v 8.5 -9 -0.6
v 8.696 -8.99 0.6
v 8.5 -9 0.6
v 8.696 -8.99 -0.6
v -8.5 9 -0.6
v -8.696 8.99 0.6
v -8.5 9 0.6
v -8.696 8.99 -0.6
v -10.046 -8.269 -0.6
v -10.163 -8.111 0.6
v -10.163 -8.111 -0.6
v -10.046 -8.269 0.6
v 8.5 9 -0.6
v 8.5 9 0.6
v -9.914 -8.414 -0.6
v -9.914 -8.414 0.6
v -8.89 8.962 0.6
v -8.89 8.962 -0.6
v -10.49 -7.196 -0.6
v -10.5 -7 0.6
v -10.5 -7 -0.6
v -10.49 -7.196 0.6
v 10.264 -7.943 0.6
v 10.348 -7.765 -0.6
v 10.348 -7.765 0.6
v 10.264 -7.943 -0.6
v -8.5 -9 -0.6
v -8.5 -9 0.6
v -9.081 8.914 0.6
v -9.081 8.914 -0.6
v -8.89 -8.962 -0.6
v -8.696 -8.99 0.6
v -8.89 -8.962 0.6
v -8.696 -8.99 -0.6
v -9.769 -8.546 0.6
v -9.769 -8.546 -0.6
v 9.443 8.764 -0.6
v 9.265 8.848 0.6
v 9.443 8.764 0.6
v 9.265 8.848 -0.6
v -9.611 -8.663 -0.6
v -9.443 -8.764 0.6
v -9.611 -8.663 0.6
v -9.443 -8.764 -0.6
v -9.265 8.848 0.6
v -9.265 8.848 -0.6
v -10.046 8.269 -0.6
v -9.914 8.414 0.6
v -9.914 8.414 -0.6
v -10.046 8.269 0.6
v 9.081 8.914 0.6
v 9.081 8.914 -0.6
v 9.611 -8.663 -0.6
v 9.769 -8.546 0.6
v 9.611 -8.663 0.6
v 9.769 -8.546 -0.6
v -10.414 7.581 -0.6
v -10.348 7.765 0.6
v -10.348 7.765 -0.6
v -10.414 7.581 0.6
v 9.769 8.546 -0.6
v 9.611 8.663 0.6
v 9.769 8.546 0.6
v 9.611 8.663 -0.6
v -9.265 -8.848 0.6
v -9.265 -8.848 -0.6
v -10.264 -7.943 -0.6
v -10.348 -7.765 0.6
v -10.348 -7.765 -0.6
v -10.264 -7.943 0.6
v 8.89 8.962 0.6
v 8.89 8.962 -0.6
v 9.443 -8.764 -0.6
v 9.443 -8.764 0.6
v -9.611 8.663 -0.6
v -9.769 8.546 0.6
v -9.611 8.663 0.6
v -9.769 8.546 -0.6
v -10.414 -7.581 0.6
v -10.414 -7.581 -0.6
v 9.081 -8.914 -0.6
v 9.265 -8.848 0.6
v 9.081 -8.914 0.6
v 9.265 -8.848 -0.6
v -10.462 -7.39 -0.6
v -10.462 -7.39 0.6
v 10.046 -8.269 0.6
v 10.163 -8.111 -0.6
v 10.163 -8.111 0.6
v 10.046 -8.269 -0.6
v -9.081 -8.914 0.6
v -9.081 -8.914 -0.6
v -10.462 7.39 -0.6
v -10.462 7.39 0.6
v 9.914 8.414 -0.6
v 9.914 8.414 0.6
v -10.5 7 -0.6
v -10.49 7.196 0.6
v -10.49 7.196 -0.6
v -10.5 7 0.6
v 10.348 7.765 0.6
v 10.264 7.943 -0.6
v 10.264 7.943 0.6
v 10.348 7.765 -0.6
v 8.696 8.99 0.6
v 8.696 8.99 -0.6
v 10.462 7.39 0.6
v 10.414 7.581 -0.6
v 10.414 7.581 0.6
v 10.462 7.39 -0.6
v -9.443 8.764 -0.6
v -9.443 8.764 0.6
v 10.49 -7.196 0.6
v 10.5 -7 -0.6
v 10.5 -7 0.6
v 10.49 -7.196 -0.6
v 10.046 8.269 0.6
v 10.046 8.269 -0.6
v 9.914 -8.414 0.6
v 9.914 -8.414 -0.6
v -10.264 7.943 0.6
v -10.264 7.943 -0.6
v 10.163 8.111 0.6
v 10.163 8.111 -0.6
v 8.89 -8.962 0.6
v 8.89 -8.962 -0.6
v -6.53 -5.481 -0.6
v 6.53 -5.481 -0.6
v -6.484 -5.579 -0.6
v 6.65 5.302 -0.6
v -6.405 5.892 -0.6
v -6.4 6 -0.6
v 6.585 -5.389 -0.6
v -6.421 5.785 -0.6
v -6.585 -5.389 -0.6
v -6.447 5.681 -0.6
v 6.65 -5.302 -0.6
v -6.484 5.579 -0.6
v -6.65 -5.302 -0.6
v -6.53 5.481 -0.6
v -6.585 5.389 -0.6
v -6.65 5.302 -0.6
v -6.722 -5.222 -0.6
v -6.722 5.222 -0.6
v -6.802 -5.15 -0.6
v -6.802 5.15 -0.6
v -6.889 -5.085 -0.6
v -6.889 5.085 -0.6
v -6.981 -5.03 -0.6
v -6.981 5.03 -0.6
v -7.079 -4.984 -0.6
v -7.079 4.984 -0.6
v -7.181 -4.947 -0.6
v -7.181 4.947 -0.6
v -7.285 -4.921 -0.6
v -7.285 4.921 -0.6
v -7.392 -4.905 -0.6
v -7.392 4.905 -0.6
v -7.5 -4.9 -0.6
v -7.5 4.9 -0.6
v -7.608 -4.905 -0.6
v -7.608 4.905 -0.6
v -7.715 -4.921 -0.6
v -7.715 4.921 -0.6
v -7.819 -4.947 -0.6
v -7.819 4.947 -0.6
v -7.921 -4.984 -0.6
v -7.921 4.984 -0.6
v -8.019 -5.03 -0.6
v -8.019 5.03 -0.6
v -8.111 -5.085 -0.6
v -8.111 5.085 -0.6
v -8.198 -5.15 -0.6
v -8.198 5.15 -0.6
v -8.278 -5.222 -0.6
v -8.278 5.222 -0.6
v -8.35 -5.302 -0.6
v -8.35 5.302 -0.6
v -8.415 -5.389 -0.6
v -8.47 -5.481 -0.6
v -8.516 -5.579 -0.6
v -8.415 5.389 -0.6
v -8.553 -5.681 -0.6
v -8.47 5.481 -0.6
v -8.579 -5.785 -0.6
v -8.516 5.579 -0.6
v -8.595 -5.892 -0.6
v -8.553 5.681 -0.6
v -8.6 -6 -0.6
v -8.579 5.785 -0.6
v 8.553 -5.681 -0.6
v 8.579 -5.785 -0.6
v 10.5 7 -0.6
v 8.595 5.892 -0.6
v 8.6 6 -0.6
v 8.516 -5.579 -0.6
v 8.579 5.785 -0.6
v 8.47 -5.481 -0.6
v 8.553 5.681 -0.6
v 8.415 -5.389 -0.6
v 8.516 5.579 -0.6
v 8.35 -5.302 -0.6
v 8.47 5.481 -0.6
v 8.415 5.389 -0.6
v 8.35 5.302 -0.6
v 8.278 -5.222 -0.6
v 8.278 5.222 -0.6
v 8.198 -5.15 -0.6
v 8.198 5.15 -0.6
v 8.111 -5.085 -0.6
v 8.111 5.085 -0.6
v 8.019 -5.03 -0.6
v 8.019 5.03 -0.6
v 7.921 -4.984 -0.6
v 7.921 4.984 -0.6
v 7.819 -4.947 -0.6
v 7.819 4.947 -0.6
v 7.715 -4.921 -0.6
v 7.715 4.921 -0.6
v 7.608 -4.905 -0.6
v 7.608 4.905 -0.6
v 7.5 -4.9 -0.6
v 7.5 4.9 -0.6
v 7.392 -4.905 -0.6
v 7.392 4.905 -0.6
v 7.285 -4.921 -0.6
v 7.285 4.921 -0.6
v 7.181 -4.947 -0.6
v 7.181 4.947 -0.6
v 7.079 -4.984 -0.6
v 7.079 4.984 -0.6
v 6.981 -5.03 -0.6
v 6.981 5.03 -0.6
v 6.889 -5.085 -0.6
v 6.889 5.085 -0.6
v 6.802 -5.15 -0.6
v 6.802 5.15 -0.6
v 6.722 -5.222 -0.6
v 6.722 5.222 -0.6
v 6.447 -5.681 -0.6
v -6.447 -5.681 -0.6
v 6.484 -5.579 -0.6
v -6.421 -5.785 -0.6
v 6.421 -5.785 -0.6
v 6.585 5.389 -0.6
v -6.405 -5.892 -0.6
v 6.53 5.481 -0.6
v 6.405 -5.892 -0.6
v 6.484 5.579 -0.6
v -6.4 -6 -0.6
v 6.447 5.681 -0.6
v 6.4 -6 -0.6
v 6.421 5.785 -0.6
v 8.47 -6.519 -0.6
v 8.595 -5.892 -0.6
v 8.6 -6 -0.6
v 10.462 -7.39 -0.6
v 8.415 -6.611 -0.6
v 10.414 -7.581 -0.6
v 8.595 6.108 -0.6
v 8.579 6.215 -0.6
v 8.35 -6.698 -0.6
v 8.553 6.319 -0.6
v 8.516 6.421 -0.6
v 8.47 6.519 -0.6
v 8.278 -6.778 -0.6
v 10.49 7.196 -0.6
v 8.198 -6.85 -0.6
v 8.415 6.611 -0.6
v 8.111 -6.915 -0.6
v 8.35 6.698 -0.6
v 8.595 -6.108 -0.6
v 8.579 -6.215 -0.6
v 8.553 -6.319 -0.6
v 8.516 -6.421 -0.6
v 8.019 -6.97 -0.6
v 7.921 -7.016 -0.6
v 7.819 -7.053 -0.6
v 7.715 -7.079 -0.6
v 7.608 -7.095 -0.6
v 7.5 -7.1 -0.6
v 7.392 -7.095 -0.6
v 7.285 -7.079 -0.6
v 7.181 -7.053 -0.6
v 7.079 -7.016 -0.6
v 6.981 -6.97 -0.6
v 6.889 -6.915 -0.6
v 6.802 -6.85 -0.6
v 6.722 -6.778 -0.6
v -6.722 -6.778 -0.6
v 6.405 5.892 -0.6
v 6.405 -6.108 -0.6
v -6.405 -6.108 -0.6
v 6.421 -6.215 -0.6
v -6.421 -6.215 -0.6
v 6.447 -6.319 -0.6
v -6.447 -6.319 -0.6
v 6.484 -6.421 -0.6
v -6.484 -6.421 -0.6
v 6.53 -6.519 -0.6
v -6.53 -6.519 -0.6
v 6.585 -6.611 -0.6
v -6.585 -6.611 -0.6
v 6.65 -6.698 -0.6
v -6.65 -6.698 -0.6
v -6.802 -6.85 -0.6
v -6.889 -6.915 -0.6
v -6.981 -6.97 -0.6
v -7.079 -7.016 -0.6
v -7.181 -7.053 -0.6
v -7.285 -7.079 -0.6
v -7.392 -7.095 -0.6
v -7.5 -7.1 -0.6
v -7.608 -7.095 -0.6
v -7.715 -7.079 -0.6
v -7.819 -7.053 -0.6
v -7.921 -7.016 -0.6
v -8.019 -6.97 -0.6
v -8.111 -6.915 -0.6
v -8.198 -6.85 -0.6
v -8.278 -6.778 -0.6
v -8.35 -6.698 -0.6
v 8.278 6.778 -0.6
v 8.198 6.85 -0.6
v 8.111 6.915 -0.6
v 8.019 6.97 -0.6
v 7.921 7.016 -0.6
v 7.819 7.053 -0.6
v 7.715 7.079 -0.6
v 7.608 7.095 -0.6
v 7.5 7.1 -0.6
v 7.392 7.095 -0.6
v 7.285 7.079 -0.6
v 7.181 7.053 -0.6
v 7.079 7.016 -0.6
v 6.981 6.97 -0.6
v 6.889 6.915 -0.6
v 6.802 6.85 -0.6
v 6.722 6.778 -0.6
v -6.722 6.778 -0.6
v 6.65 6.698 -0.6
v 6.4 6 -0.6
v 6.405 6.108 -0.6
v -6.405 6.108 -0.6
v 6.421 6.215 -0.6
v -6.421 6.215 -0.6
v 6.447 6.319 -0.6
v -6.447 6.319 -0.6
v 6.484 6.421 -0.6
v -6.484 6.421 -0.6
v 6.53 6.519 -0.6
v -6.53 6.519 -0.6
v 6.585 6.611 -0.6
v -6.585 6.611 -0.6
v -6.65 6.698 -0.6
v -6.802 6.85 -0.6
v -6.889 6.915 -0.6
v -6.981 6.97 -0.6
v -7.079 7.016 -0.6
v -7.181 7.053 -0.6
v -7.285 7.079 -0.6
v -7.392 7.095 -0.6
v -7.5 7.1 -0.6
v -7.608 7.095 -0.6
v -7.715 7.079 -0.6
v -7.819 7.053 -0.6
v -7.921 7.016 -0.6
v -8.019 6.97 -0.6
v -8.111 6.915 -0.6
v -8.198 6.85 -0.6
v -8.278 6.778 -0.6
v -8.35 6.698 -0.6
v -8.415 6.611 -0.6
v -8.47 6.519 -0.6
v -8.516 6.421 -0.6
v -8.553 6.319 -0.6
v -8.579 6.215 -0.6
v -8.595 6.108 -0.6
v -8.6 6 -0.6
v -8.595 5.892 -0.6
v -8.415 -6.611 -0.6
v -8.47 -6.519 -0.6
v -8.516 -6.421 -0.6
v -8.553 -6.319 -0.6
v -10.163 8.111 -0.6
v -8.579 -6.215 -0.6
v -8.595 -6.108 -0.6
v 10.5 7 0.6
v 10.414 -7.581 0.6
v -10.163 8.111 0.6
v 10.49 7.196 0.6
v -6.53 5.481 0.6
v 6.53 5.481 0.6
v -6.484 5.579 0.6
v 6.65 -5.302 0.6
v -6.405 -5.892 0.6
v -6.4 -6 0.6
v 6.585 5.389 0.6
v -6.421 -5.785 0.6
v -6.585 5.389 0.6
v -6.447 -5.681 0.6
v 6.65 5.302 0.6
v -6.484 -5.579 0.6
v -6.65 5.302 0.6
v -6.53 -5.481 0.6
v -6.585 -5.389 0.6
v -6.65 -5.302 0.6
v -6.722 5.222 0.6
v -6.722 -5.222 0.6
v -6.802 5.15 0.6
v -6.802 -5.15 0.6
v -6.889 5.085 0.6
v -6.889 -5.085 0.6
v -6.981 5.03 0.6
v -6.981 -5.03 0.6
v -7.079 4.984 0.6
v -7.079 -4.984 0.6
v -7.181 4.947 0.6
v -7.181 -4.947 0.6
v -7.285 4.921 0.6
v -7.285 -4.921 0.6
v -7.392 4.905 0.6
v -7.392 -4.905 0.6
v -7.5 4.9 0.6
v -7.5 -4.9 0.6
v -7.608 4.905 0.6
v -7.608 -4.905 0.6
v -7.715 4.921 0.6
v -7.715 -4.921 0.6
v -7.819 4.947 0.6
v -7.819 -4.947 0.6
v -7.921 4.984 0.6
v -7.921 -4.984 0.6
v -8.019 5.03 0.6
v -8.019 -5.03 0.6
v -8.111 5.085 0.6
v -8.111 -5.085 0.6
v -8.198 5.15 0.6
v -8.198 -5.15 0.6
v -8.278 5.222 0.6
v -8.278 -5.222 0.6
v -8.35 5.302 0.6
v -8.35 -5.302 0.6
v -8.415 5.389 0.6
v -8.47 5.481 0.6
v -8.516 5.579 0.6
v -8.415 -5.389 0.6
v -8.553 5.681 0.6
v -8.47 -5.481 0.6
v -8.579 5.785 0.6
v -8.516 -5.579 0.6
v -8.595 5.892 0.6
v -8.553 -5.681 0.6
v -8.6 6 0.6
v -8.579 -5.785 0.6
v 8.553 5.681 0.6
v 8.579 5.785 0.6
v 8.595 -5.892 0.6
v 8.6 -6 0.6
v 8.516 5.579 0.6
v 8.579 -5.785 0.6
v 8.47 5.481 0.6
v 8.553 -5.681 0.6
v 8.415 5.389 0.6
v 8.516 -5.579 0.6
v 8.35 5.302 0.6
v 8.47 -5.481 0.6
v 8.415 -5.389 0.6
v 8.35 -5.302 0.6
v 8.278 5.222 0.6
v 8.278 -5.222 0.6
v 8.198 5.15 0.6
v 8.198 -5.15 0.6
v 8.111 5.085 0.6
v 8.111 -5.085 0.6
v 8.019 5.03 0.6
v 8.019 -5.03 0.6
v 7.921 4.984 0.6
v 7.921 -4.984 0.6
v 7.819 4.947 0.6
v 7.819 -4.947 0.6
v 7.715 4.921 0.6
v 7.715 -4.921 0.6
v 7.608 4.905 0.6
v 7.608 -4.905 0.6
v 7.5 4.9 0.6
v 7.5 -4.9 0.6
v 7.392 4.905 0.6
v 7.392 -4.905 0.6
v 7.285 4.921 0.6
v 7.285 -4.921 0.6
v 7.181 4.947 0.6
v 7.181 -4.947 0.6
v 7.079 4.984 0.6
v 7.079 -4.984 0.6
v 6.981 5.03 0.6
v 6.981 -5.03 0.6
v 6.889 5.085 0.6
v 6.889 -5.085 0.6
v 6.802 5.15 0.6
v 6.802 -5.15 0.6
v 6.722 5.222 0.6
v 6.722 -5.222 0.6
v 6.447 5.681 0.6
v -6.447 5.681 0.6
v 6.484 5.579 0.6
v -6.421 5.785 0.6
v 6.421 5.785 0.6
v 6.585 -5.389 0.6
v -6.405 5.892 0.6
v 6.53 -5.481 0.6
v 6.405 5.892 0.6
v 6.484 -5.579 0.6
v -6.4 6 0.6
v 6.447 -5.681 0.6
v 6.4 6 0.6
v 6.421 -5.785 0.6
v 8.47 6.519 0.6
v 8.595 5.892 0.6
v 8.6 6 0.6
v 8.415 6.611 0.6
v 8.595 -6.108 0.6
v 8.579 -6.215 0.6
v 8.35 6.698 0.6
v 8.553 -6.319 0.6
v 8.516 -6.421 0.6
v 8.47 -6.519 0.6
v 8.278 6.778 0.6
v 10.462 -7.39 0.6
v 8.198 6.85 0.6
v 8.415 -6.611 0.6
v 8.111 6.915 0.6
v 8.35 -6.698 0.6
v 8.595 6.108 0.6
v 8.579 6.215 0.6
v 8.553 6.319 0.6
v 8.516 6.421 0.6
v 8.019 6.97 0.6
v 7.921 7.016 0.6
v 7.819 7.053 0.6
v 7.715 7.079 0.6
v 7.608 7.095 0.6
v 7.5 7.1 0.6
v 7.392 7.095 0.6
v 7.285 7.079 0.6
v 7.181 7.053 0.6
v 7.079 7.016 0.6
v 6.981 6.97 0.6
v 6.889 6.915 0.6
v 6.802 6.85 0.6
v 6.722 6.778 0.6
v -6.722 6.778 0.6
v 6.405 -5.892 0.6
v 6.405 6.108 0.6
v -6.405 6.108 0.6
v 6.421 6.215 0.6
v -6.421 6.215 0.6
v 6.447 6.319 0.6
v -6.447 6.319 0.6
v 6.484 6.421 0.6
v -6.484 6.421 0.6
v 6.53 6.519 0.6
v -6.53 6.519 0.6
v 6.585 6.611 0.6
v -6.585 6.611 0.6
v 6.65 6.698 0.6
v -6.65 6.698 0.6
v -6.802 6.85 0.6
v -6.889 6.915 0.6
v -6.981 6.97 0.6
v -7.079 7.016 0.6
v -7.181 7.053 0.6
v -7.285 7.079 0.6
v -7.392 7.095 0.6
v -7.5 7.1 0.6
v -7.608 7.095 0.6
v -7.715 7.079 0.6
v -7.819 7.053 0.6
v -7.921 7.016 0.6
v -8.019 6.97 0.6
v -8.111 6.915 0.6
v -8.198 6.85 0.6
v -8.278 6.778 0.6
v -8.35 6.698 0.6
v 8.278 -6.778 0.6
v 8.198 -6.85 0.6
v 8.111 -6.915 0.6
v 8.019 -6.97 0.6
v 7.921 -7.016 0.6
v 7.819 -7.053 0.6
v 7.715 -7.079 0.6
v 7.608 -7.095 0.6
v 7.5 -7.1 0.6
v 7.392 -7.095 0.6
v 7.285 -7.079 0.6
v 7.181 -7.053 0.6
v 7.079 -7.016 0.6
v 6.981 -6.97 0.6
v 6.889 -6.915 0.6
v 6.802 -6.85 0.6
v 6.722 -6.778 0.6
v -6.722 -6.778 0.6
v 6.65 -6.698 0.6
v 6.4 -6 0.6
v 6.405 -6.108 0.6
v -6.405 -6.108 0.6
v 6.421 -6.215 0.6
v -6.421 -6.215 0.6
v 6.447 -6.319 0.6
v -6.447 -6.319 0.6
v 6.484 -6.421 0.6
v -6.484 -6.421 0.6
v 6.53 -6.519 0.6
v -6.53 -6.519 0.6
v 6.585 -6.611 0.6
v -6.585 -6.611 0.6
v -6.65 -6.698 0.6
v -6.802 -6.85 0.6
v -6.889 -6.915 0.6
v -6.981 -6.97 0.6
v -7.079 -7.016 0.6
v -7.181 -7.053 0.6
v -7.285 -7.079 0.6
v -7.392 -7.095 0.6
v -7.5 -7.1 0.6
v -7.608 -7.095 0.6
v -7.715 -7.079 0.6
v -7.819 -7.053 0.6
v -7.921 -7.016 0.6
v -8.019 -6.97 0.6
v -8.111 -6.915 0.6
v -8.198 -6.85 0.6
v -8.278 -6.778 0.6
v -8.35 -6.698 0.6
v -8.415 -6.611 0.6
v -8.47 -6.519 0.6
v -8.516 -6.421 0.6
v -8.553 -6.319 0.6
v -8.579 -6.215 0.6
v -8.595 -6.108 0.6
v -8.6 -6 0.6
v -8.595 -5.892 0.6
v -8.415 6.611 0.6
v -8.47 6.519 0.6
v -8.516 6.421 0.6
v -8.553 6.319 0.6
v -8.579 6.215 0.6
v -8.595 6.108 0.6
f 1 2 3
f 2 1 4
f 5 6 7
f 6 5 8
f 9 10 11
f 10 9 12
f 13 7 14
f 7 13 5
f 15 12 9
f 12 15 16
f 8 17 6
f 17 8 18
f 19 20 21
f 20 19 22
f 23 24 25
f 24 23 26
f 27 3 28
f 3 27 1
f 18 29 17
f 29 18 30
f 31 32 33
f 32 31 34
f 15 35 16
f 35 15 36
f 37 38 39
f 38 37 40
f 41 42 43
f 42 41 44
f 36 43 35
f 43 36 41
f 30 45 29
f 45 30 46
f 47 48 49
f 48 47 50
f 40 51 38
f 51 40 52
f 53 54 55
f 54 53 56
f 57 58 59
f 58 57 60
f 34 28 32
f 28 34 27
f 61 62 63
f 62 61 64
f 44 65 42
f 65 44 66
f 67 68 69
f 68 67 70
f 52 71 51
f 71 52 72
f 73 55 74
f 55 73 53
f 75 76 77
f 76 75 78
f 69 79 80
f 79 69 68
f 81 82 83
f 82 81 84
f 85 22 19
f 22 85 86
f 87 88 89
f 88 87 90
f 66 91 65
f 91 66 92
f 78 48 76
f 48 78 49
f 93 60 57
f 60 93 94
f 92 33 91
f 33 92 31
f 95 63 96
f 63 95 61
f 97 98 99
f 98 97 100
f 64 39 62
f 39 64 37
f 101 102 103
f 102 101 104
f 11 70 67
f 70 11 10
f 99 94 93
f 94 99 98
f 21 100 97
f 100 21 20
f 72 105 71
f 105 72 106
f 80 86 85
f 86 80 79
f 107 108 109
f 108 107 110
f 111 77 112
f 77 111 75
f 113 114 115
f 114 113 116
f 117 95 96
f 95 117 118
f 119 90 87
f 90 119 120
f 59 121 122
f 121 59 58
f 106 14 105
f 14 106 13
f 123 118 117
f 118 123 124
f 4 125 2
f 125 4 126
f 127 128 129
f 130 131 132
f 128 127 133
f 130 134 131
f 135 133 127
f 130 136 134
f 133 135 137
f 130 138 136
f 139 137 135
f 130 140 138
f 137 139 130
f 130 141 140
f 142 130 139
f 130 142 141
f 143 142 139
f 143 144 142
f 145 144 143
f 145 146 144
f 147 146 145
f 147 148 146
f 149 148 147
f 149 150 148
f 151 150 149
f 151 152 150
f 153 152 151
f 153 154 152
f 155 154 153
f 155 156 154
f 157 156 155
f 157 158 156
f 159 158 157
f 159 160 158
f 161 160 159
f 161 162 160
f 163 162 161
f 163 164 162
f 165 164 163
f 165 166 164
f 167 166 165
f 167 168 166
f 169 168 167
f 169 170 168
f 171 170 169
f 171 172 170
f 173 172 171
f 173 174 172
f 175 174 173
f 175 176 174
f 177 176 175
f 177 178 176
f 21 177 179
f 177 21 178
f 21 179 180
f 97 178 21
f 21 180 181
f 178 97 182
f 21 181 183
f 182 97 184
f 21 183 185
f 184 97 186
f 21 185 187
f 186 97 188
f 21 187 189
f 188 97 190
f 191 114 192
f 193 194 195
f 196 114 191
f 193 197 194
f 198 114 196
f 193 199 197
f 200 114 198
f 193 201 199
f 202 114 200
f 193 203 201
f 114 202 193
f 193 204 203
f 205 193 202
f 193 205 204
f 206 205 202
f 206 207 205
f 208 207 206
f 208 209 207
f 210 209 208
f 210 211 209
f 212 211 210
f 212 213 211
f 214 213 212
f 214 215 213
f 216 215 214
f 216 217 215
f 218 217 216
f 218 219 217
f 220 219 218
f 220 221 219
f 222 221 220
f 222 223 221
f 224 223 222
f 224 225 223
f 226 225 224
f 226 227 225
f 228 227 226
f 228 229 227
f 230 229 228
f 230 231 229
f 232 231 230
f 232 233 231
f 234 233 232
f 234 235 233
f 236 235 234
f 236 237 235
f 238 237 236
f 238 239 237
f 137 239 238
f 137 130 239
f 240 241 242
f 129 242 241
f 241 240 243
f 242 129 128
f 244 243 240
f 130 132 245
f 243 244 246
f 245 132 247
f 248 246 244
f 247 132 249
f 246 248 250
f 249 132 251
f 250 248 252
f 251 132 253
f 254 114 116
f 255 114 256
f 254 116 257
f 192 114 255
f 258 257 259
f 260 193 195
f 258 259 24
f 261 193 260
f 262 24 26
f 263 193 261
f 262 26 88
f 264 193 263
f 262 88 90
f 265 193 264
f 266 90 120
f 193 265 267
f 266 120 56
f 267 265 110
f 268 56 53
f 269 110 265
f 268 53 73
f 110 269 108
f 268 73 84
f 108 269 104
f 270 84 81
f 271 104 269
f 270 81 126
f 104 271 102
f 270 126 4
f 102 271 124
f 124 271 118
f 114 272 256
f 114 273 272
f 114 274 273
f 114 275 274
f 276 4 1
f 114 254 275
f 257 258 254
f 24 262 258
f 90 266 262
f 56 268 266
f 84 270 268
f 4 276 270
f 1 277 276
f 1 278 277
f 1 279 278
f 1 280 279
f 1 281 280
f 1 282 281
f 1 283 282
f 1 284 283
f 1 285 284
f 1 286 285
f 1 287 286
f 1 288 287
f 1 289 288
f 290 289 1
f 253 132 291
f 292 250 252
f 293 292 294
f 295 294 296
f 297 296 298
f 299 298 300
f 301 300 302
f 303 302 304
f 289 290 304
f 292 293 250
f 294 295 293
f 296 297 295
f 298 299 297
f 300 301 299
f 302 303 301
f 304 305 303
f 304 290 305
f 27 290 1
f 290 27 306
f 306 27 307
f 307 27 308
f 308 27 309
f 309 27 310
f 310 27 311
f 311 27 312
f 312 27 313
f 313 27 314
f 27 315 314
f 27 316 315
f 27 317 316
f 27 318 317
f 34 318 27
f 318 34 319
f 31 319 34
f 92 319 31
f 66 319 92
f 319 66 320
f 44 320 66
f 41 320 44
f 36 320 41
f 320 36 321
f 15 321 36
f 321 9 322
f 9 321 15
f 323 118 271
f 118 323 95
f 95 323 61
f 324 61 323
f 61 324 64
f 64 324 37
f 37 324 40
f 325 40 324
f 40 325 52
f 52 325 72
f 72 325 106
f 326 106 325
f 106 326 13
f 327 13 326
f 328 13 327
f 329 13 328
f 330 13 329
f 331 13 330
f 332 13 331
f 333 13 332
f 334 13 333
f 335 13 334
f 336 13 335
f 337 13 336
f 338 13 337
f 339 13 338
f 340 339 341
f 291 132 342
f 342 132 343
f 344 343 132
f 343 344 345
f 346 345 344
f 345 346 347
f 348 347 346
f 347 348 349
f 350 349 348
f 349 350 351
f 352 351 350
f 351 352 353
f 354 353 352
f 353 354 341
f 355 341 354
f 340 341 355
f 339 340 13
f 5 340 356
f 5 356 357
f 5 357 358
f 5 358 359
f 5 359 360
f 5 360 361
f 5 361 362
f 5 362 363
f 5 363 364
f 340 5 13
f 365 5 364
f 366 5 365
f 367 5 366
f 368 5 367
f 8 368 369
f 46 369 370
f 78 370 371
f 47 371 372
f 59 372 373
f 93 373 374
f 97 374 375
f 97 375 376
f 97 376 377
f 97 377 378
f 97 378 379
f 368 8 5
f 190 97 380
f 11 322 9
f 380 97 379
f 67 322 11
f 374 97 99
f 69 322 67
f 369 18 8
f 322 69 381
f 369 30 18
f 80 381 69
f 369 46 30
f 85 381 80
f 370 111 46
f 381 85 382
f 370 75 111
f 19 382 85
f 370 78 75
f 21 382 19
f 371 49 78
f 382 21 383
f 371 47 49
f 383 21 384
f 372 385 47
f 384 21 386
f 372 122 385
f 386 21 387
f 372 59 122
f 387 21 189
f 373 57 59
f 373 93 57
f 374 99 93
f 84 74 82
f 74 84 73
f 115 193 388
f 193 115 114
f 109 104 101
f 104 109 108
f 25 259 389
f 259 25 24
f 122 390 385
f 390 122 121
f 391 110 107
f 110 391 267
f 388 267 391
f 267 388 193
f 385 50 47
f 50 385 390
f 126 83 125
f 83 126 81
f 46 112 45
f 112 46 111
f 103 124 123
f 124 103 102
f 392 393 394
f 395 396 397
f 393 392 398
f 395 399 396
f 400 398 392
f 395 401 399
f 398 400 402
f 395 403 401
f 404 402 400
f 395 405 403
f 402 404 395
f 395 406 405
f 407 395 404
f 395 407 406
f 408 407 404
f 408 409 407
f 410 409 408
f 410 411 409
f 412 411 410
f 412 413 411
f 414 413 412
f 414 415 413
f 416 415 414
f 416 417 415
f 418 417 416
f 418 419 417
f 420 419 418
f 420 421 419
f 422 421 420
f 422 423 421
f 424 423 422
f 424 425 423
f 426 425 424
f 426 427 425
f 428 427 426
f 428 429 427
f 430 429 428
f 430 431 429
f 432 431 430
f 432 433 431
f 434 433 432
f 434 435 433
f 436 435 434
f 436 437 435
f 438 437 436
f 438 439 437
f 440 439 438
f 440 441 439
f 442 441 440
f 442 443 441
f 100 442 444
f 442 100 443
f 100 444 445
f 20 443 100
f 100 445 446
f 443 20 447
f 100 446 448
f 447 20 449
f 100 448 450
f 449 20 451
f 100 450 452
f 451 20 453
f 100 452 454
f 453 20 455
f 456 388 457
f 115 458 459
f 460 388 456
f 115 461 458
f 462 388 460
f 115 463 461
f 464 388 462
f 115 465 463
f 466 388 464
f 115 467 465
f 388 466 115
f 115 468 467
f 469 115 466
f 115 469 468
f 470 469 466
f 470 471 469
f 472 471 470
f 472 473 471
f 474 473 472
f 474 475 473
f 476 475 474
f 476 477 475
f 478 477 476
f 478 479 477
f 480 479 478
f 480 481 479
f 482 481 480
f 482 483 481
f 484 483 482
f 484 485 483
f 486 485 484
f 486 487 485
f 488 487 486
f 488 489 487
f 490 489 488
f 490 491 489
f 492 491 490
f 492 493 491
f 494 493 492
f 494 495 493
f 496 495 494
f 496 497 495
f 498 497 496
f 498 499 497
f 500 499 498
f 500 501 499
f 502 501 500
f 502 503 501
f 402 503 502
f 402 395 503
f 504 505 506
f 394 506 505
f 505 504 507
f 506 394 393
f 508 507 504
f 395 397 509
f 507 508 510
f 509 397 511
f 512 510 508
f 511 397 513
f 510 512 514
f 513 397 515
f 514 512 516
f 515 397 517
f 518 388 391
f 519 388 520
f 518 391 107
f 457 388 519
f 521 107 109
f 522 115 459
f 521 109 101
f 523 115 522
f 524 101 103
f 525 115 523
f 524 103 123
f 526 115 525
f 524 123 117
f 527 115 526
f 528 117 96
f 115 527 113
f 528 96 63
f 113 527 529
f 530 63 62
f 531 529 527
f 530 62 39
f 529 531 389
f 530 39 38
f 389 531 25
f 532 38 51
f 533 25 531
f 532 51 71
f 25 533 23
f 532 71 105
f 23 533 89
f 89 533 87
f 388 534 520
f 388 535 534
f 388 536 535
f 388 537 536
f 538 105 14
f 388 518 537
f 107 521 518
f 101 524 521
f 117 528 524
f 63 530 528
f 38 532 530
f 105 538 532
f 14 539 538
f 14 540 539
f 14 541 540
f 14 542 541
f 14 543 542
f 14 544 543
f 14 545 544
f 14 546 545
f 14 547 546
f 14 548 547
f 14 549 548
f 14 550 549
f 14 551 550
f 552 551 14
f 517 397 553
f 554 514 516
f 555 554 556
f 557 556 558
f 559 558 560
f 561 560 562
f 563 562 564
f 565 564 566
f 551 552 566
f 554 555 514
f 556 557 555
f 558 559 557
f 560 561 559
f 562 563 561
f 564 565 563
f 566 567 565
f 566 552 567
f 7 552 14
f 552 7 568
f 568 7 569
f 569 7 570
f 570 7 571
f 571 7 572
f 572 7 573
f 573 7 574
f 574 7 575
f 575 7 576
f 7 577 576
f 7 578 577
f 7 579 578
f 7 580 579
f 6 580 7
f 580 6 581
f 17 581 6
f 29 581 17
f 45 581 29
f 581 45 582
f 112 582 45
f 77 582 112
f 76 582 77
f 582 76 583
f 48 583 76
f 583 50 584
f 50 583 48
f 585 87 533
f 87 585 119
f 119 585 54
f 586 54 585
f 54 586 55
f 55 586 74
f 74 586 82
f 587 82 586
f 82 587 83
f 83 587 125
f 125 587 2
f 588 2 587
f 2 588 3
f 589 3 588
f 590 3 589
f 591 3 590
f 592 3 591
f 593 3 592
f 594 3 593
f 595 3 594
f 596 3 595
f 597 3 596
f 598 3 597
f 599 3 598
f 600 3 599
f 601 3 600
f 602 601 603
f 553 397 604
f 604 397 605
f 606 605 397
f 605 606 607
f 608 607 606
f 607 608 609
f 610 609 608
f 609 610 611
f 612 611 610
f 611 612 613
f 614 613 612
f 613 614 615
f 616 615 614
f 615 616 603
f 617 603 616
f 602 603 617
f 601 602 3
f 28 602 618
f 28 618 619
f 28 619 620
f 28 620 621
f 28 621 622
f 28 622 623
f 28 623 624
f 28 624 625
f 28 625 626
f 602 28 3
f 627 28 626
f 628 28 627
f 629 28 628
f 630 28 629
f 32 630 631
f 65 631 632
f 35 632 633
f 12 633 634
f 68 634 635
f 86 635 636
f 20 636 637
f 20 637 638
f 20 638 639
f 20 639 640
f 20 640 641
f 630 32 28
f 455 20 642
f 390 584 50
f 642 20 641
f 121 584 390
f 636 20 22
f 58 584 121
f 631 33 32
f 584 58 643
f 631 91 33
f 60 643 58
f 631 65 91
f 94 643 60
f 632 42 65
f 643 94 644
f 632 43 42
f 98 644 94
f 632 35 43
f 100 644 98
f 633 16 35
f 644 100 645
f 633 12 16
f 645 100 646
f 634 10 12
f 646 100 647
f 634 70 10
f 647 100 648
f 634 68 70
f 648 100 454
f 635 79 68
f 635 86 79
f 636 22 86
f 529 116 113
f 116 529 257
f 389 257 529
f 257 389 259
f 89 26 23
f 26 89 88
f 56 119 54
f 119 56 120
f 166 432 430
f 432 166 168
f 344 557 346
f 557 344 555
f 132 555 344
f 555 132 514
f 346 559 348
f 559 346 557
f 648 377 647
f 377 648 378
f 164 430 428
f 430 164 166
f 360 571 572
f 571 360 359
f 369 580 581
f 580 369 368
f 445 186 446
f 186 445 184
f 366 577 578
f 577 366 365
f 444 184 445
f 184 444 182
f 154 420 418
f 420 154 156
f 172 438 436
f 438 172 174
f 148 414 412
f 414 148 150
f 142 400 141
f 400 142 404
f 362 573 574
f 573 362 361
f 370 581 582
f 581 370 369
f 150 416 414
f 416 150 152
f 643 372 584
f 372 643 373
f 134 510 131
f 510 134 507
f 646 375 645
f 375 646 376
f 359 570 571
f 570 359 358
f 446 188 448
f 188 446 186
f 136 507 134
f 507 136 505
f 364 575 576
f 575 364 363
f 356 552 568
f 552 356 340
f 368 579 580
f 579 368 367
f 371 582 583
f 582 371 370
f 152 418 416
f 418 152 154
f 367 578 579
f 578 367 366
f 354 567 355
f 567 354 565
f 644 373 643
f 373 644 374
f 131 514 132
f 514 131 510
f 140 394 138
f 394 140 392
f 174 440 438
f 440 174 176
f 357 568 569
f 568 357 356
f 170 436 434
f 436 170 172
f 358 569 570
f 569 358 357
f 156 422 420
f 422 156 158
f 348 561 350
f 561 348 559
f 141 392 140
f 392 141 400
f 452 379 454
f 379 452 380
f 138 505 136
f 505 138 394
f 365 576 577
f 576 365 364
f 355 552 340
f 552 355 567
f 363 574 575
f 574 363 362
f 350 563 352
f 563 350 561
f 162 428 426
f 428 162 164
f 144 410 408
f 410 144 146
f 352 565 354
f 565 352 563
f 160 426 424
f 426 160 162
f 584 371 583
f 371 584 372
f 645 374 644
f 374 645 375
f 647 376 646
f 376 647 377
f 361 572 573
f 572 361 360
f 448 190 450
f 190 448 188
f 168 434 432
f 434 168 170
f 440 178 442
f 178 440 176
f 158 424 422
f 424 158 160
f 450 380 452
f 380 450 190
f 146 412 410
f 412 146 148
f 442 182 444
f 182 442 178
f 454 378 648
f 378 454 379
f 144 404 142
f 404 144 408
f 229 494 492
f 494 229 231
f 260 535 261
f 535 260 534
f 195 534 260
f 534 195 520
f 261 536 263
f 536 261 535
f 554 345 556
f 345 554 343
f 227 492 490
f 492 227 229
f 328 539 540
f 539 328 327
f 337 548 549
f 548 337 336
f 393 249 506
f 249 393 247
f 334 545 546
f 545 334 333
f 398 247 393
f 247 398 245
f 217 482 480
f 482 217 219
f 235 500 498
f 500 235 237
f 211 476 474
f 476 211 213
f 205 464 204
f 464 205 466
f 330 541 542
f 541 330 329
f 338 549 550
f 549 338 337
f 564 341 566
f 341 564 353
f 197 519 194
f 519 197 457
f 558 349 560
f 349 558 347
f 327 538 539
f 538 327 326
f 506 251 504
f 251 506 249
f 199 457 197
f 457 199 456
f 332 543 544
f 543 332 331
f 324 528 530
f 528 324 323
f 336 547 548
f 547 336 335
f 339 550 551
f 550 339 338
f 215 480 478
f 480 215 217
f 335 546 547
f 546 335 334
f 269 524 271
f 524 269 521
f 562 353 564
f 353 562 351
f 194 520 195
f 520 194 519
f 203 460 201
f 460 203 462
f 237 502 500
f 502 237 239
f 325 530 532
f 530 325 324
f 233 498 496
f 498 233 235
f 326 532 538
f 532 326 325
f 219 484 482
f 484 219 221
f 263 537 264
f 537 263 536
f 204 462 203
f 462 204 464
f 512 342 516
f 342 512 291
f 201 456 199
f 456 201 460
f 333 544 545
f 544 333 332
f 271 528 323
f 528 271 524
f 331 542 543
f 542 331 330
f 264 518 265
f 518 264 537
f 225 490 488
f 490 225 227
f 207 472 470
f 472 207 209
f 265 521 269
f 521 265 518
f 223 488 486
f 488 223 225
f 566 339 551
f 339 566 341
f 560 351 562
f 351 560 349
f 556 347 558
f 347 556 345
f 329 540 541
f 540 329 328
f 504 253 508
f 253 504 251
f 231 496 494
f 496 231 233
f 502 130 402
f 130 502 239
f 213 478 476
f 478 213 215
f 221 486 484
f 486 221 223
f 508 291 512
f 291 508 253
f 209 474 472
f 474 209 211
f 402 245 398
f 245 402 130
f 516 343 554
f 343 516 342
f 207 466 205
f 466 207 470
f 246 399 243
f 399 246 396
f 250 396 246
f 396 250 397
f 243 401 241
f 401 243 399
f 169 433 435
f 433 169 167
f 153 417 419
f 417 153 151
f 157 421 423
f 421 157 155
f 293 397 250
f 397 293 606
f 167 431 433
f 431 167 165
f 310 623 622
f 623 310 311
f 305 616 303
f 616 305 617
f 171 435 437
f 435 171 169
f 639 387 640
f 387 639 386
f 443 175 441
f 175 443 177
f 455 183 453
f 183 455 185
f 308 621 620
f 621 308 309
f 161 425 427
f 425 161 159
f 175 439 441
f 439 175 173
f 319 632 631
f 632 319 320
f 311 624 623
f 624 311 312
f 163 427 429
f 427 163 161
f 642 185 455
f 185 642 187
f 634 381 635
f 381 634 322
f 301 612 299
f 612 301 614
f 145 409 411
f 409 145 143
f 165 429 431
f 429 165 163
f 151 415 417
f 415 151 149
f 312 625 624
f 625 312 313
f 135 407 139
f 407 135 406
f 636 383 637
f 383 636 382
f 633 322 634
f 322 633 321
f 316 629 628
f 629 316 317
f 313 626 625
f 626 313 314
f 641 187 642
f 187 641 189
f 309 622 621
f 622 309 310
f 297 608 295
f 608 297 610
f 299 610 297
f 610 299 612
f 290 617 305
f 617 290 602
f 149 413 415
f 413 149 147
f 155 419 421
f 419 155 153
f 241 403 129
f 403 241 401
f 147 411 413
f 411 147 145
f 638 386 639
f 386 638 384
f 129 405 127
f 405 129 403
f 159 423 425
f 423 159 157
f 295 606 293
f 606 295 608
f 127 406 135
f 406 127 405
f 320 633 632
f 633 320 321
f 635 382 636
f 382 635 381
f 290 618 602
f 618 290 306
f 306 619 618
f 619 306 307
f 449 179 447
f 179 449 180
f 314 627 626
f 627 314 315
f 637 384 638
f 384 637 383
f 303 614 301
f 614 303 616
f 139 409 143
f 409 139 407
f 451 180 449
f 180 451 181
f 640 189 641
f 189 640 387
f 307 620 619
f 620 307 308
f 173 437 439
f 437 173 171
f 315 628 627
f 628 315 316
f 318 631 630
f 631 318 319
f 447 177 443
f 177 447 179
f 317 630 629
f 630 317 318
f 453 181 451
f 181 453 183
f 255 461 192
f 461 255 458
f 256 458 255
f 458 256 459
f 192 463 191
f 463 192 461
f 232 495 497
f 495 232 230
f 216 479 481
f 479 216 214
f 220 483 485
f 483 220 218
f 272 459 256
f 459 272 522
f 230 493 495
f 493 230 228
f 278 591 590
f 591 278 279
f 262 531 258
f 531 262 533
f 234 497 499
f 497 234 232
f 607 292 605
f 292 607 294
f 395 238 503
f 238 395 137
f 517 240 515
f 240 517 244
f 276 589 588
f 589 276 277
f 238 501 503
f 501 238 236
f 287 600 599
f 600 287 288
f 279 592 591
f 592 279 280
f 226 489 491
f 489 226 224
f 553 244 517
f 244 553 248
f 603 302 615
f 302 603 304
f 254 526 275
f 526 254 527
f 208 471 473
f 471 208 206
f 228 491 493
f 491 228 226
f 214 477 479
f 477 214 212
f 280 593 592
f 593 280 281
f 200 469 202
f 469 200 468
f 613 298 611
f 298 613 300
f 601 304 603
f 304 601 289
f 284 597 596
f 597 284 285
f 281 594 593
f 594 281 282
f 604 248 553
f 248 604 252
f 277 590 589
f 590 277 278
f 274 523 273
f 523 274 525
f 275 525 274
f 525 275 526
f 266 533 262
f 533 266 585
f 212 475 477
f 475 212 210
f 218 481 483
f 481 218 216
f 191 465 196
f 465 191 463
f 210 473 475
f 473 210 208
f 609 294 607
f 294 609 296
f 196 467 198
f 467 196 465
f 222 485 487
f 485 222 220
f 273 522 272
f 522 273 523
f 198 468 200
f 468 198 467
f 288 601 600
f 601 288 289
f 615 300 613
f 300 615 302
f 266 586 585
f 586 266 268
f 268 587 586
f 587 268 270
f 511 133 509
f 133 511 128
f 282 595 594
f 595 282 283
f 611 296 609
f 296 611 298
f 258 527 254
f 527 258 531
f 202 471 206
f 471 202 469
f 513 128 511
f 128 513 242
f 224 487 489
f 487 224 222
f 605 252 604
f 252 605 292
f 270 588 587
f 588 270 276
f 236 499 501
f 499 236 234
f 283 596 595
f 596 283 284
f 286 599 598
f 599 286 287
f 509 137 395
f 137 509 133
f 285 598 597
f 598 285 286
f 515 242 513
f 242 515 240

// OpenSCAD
// PCB: 21.0mm x 18.0mm x 1.2mm (one connected solid)

// Parameters
pcb_length = 21.0;
pcb_width  = 18.0;
pcb_thickness = 1.2;

corner_radius = 2.0;

mount_hole_diameter = 2.2;
mount_hole_edge_offset = 3.0;

pad_diameter = 1.6;
pad_thickness = 0.05;

silk_line_width = 0.4;
silk_thickness = 0.05;
silk_margin = 1.0;

finger_count = 6;
finger_width = 1.5;
finger_length = 4.0;
finger_thickness = 0.05;

feature_overlap = 0.6;   // overlap to guarantee watertight unions/differences
$fn = 64;

// --- Helpers ---
function clamp(v, lo, hi) = v < lo ? lo : (v > hi ? hi : v);

// Rounded rectangle prism using linear_extrude of a 2D rounded rectangle
module rounded_rect_prism(L, W, H, R) {
  R2 = clamp(R, 0, min(L, W)/2);
  linear_extrude(height=H, center=true, convexity=10)
    offset(r=R2)
      square([L - 2*R2, W - 2*R2], center=true);
}

module mount_hole(x, y) {
  translate([x, y, 0])
    cylinder(d=mount_hole_diameter, h=pcb_thickness + 2*feature_overlap, center=true);
}

module pad(x, y) {
  // Slightly overlap into PCB so pads are connected to the main solid
  translate([x, y, pcb_thickness/2 + pad_thickness/2 - feature_overlap])
    cylinder(d=pad_diameter, h=pad_thickness + feature_overlap, center=true);
}

module silk_line(x, y, len, wid) {
  translate([x, y, pcb_thickness/2 + silk_thickness/2 - feature_overlap])
    cube([len, wid, silk_thickness + feature_overlap], center=true);
}

module finger(x, y) {
  translate([x, y, pcb_thickness/2 + finger_thickness/2 - feature_overlap])
    cube([finger_length, finger_width, finger_thickness + feature_overlap], center=true);
}

// --- Main PCB body (exact 21x18 outline, 1.2 thick) ---
module pcb_body_with_holes() {
  difference() {
    rounded_rect_prism(pcb_length, pcb_width, pcb_thickness, corner_radius);

    // 4 mounting holes, placed by formula from dimensions
    mount_hole(-pcb_length/2 + mount_hole_edge_offset,  pcb_width/2 - mount_hole_edge_offset);
    mount_hole( pcb_length/2 - mount_hole_edge_offset,  pcb_width/2 - mount_hole_edge_offset);
    mount_hole(-pcb_length/2 + mount_hole_edge_offset, -pcb_width/2 + mount_hole_edge_offset);
    mount_hole( pcb_length/2 - mount_hole_edge_offset, -pcb_width/2 + mount_hole_edge_offset);
  }
}

module copper_pads() {
  union() {
    pad(-pcb_length/4,  pcb_width/4);
    pad( pcb_length/4,  pcb_width/4);
    pad(-pcb_length/4, -pcb_width/4);
    pad( pcb_length/4, -pcb_width/4);
  }
}

module silkscreen_markings() {
  union() {
    // Top/bottom lines
    silk_line(0,  pcb_width/2 - silk_margin, pcb_length - 2*silk_margin, silk_line_width);
    silk_line(0, -pcb_width/2 + silk_margin, pcb_length - 2*silk_margin, silk_line_width);

    // Left/right lines (swap len/wid to make vertical bars)
    silk_line(-pcb_length/2 + silk_margin, 0, silk_line_width, pcb_width - 2*silk_margin);
    silk_line( pcb_length/2 - silk_margin, 0, silk_line_width, pcb_width - 2*silk_margin);
  }
}

module edge_connector_fingers() {
  union() {
    // Keep fingers within board width
    usable_w = pcb_width - 2*silk_margin;
    pitch = finger_width;
    total = finger_count * pitch;
    y0 = -total/2 + pitch/2;

    for (i = [0:finger_count-1]) {
      y = y0 + i*pitch;
      // Place at right edge, connected by overlap
      x = pcb_length/2 - finger_length/2;
      finger(x, y);
    }
  }
}

module pcb_complete() {
  // One connected solid: pads/silk/fingers overlap into the PCB
  union() {
    pcb_body_with_holes();
    copper_pads();
    silkscreen_markings();
    edge_connector_fingers();
  }
}

// Final Output
color([0.0, 0.4, 0.2]) pcb_complete();
